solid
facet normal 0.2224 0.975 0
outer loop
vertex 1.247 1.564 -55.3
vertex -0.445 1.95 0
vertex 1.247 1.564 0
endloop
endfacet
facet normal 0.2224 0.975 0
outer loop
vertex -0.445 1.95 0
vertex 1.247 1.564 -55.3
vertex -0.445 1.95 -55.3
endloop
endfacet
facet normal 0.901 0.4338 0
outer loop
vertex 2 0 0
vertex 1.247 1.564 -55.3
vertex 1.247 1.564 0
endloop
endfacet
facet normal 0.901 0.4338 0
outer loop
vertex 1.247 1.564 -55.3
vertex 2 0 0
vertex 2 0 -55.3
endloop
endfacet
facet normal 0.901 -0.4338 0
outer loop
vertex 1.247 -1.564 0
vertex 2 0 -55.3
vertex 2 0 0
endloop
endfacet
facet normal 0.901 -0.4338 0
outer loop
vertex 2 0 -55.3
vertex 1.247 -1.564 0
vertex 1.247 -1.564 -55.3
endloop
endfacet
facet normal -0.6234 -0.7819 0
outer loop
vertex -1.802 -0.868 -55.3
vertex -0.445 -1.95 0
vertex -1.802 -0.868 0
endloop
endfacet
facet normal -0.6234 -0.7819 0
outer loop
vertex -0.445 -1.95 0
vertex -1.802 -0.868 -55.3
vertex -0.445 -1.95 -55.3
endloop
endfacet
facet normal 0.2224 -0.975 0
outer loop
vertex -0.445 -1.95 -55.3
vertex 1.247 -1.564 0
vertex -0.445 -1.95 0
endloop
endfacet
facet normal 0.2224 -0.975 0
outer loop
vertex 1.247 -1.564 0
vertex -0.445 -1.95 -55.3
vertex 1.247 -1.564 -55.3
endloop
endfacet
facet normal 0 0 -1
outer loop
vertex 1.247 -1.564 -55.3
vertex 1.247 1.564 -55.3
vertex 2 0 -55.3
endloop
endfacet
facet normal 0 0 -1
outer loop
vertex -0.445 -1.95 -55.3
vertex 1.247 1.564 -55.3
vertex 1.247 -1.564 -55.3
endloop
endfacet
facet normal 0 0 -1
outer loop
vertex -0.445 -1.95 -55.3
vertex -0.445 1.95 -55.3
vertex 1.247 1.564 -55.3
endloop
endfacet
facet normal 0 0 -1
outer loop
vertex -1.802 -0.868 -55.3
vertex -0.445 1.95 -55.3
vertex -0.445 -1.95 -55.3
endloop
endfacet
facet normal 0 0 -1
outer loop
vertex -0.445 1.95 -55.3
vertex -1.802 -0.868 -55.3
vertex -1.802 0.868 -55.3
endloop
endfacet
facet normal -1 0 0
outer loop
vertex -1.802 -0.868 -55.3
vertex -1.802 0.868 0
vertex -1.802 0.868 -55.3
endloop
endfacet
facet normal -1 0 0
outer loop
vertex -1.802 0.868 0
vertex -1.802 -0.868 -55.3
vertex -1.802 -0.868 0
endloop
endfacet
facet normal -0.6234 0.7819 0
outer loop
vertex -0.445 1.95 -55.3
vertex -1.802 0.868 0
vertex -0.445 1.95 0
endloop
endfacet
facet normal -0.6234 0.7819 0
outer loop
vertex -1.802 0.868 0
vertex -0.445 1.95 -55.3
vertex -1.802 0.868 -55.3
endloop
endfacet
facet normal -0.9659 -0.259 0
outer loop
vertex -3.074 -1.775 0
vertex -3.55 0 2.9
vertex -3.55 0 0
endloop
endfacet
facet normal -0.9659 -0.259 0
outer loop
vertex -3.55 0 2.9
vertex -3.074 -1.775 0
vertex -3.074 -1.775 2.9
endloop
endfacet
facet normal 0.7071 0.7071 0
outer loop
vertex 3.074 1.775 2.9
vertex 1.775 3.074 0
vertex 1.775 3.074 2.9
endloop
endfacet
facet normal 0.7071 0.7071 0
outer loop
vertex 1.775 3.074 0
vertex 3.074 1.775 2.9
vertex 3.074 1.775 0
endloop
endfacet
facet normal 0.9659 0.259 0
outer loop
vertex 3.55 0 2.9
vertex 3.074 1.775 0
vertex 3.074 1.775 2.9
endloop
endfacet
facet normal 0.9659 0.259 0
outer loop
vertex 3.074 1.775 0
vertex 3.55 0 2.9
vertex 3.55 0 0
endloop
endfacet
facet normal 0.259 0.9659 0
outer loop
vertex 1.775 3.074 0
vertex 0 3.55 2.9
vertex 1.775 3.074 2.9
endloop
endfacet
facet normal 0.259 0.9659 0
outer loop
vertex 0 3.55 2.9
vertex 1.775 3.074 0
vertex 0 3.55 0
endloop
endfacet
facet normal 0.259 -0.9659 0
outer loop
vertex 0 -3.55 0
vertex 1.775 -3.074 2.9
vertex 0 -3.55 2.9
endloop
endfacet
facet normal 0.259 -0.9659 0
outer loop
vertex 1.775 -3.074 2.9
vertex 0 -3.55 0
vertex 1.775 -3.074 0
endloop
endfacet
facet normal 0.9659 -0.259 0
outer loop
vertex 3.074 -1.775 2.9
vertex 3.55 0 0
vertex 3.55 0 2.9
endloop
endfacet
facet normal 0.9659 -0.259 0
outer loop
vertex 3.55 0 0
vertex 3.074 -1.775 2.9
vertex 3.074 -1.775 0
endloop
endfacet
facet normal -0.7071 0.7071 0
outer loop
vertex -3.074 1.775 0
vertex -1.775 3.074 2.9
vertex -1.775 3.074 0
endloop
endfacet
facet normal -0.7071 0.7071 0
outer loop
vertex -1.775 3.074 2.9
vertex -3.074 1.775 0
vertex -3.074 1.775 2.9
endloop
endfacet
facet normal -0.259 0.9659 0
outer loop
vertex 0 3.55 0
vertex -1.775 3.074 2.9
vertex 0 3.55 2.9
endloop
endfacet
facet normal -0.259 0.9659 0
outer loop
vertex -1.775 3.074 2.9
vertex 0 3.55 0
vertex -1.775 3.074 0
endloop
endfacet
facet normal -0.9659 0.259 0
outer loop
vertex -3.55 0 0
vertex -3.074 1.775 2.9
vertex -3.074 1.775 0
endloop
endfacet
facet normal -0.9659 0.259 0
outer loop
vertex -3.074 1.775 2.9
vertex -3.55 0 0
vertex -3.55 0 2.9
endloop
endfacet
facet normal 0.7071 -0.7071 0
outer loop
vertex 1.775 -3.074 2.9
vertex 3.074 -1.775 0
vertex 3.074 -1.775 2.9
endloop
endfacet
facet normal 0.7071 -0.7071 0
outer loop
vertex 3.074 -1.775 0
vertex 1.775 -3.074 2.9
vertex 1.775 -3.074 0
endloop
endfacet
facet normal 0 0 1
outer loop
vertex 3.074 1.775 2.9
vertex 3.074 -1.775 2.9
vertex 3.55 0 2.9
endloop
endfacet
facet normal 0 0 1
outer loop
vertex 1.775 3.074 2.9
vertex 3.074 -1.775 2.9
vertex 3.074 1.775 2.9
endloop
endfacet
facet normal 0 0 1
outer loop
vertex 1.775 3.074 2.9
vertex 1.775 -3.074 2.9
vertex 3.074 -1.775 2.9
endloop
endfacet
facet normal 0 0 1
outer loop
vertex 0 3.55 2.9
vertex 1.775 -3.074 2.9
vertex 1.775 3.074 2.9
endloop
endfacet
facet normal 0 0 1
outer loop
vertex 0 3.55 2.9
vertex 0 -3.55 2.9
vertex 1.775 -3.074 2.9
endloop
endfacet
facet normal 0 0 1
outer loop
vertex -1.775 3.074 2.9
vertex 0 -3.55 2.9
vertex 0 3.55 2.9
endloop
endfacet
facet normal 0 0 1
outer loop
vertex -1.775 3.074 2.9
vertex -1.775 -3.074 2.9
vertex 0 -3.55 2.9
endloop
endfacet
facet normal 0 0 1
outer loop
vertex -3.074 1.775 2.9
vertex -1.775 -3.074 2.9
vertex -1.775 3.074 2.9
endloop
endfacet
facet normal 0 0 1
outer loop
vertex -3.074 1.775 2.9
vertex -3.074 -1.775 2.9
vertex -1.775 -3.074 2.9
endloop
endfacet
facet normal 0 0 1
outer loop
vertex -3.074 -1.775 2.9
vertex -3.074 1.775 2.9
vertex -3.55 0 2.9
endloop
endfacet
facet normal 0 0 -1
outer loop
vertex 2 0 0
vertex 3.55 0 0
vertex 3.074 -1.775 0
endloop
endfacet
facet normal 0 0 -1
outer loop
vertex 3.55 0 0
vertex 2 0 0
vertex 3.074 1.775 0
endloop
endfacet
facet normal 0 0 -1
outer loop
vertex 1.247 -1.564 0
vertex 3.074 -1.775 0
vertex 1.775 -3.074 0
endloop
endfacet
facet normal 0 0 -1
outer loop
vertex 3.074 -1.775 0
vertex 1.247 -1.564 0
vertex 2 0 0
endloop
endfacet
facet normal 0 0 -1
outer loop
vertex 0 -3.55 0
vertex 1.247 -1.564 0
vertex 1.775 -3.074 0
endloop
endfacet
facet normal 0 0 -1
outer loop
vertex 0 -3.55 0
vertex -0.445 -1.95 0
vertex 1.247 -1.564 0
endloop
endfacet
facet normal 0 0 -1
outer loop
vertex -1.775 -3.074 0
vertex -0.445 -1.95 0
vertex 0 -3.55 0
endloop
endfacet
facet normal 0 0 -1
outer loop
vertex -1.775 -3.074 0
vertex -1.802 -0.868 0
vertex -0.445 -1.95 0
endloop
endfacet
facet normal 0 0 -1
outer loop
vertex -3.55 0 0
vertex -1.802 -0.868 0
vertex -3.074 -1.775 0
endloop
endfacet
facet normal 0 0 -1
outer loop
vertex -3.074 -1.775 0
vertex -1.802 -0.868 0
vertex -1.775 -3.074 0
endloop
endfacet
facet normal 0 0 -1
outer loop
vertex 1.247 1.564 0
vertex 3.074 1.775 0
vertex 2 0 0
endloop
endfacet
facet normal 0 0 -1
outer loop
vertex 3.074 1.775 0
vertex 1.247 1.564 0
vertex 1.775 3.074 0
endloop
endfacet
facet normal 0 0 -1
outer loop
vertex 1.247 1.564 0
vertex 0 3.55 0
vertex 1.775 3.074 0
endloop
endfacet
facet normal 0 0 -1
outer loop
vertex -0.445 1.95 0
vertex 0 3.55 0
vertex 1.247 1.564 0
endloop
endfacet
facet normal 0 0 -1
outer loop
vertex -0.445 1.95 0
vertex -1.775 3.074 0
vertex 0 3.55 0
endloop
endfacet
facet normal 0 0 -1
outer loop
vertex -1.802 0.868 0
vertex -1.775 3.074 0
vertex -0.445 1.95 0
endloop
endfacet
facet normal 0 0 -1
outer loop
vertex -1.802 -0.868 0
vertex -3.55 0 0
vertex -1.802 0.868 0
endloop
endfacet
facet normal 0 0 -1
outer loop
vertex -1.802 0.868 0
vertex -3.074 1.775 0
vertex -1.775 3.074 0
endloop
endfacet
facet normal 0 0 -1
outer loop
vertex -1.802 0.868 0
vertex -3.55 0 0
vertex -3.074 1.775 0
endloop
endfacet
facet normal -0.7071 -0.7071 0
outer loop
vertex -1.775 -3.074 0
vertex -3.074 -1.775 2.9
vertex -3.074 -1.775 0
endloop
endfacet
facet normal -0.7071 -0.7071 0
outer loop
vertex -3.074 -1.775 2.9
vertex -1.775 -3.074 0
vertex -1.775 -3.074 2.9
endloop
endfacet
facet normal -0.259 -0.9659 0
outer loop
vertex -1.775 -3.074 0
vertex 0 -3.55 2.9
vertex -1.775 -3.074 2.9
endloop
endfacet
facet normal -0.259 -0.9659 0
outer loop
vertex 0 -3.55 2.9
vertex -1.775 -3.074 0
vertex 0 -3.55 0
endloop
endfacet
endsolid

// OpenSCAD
function HiLoScrewDiameter(3dPrinterTolerance=.4)= 3.6+3dPrinterTolerance;  
function HiLoScrewLength(3dPrinterTolerance=.4)= 55+3dPrinterTolerance;
function HiLoScrewHeadDiameter(3dPrinterTolerance=.4)= 6.7+3dPrinterTolerance;
function HiLoScrewHeadHeight(3dPrinterTolerance=.4)= 2.5+3dPrinterTolerance;

//err on the side of smaller tolerances for screws

module HiLoScrew(3dPrinterTolerance=.4)
{
	union()
	{
		translate([0,0,-HiLoScrewLength(3dPrinterTolerance)+.1])
		{
			cylinder(HiLoScrewLength(3dPrinterTolerance), HiLoScrewDiameter(3dPrinterTolerance)/2, HiLoScrewDiameter(3dPrinterTolerance)/2);
		}
		cylinder(HiLoScrewHeadHeight(3dPrinterTolerance), HiLoScrewHeadDiameter(3dPrinterTolerance)/2,HiLoScrewHeadDiameter(3dPrinterTolerance)/2);
	}
}

HiLoScrew();
